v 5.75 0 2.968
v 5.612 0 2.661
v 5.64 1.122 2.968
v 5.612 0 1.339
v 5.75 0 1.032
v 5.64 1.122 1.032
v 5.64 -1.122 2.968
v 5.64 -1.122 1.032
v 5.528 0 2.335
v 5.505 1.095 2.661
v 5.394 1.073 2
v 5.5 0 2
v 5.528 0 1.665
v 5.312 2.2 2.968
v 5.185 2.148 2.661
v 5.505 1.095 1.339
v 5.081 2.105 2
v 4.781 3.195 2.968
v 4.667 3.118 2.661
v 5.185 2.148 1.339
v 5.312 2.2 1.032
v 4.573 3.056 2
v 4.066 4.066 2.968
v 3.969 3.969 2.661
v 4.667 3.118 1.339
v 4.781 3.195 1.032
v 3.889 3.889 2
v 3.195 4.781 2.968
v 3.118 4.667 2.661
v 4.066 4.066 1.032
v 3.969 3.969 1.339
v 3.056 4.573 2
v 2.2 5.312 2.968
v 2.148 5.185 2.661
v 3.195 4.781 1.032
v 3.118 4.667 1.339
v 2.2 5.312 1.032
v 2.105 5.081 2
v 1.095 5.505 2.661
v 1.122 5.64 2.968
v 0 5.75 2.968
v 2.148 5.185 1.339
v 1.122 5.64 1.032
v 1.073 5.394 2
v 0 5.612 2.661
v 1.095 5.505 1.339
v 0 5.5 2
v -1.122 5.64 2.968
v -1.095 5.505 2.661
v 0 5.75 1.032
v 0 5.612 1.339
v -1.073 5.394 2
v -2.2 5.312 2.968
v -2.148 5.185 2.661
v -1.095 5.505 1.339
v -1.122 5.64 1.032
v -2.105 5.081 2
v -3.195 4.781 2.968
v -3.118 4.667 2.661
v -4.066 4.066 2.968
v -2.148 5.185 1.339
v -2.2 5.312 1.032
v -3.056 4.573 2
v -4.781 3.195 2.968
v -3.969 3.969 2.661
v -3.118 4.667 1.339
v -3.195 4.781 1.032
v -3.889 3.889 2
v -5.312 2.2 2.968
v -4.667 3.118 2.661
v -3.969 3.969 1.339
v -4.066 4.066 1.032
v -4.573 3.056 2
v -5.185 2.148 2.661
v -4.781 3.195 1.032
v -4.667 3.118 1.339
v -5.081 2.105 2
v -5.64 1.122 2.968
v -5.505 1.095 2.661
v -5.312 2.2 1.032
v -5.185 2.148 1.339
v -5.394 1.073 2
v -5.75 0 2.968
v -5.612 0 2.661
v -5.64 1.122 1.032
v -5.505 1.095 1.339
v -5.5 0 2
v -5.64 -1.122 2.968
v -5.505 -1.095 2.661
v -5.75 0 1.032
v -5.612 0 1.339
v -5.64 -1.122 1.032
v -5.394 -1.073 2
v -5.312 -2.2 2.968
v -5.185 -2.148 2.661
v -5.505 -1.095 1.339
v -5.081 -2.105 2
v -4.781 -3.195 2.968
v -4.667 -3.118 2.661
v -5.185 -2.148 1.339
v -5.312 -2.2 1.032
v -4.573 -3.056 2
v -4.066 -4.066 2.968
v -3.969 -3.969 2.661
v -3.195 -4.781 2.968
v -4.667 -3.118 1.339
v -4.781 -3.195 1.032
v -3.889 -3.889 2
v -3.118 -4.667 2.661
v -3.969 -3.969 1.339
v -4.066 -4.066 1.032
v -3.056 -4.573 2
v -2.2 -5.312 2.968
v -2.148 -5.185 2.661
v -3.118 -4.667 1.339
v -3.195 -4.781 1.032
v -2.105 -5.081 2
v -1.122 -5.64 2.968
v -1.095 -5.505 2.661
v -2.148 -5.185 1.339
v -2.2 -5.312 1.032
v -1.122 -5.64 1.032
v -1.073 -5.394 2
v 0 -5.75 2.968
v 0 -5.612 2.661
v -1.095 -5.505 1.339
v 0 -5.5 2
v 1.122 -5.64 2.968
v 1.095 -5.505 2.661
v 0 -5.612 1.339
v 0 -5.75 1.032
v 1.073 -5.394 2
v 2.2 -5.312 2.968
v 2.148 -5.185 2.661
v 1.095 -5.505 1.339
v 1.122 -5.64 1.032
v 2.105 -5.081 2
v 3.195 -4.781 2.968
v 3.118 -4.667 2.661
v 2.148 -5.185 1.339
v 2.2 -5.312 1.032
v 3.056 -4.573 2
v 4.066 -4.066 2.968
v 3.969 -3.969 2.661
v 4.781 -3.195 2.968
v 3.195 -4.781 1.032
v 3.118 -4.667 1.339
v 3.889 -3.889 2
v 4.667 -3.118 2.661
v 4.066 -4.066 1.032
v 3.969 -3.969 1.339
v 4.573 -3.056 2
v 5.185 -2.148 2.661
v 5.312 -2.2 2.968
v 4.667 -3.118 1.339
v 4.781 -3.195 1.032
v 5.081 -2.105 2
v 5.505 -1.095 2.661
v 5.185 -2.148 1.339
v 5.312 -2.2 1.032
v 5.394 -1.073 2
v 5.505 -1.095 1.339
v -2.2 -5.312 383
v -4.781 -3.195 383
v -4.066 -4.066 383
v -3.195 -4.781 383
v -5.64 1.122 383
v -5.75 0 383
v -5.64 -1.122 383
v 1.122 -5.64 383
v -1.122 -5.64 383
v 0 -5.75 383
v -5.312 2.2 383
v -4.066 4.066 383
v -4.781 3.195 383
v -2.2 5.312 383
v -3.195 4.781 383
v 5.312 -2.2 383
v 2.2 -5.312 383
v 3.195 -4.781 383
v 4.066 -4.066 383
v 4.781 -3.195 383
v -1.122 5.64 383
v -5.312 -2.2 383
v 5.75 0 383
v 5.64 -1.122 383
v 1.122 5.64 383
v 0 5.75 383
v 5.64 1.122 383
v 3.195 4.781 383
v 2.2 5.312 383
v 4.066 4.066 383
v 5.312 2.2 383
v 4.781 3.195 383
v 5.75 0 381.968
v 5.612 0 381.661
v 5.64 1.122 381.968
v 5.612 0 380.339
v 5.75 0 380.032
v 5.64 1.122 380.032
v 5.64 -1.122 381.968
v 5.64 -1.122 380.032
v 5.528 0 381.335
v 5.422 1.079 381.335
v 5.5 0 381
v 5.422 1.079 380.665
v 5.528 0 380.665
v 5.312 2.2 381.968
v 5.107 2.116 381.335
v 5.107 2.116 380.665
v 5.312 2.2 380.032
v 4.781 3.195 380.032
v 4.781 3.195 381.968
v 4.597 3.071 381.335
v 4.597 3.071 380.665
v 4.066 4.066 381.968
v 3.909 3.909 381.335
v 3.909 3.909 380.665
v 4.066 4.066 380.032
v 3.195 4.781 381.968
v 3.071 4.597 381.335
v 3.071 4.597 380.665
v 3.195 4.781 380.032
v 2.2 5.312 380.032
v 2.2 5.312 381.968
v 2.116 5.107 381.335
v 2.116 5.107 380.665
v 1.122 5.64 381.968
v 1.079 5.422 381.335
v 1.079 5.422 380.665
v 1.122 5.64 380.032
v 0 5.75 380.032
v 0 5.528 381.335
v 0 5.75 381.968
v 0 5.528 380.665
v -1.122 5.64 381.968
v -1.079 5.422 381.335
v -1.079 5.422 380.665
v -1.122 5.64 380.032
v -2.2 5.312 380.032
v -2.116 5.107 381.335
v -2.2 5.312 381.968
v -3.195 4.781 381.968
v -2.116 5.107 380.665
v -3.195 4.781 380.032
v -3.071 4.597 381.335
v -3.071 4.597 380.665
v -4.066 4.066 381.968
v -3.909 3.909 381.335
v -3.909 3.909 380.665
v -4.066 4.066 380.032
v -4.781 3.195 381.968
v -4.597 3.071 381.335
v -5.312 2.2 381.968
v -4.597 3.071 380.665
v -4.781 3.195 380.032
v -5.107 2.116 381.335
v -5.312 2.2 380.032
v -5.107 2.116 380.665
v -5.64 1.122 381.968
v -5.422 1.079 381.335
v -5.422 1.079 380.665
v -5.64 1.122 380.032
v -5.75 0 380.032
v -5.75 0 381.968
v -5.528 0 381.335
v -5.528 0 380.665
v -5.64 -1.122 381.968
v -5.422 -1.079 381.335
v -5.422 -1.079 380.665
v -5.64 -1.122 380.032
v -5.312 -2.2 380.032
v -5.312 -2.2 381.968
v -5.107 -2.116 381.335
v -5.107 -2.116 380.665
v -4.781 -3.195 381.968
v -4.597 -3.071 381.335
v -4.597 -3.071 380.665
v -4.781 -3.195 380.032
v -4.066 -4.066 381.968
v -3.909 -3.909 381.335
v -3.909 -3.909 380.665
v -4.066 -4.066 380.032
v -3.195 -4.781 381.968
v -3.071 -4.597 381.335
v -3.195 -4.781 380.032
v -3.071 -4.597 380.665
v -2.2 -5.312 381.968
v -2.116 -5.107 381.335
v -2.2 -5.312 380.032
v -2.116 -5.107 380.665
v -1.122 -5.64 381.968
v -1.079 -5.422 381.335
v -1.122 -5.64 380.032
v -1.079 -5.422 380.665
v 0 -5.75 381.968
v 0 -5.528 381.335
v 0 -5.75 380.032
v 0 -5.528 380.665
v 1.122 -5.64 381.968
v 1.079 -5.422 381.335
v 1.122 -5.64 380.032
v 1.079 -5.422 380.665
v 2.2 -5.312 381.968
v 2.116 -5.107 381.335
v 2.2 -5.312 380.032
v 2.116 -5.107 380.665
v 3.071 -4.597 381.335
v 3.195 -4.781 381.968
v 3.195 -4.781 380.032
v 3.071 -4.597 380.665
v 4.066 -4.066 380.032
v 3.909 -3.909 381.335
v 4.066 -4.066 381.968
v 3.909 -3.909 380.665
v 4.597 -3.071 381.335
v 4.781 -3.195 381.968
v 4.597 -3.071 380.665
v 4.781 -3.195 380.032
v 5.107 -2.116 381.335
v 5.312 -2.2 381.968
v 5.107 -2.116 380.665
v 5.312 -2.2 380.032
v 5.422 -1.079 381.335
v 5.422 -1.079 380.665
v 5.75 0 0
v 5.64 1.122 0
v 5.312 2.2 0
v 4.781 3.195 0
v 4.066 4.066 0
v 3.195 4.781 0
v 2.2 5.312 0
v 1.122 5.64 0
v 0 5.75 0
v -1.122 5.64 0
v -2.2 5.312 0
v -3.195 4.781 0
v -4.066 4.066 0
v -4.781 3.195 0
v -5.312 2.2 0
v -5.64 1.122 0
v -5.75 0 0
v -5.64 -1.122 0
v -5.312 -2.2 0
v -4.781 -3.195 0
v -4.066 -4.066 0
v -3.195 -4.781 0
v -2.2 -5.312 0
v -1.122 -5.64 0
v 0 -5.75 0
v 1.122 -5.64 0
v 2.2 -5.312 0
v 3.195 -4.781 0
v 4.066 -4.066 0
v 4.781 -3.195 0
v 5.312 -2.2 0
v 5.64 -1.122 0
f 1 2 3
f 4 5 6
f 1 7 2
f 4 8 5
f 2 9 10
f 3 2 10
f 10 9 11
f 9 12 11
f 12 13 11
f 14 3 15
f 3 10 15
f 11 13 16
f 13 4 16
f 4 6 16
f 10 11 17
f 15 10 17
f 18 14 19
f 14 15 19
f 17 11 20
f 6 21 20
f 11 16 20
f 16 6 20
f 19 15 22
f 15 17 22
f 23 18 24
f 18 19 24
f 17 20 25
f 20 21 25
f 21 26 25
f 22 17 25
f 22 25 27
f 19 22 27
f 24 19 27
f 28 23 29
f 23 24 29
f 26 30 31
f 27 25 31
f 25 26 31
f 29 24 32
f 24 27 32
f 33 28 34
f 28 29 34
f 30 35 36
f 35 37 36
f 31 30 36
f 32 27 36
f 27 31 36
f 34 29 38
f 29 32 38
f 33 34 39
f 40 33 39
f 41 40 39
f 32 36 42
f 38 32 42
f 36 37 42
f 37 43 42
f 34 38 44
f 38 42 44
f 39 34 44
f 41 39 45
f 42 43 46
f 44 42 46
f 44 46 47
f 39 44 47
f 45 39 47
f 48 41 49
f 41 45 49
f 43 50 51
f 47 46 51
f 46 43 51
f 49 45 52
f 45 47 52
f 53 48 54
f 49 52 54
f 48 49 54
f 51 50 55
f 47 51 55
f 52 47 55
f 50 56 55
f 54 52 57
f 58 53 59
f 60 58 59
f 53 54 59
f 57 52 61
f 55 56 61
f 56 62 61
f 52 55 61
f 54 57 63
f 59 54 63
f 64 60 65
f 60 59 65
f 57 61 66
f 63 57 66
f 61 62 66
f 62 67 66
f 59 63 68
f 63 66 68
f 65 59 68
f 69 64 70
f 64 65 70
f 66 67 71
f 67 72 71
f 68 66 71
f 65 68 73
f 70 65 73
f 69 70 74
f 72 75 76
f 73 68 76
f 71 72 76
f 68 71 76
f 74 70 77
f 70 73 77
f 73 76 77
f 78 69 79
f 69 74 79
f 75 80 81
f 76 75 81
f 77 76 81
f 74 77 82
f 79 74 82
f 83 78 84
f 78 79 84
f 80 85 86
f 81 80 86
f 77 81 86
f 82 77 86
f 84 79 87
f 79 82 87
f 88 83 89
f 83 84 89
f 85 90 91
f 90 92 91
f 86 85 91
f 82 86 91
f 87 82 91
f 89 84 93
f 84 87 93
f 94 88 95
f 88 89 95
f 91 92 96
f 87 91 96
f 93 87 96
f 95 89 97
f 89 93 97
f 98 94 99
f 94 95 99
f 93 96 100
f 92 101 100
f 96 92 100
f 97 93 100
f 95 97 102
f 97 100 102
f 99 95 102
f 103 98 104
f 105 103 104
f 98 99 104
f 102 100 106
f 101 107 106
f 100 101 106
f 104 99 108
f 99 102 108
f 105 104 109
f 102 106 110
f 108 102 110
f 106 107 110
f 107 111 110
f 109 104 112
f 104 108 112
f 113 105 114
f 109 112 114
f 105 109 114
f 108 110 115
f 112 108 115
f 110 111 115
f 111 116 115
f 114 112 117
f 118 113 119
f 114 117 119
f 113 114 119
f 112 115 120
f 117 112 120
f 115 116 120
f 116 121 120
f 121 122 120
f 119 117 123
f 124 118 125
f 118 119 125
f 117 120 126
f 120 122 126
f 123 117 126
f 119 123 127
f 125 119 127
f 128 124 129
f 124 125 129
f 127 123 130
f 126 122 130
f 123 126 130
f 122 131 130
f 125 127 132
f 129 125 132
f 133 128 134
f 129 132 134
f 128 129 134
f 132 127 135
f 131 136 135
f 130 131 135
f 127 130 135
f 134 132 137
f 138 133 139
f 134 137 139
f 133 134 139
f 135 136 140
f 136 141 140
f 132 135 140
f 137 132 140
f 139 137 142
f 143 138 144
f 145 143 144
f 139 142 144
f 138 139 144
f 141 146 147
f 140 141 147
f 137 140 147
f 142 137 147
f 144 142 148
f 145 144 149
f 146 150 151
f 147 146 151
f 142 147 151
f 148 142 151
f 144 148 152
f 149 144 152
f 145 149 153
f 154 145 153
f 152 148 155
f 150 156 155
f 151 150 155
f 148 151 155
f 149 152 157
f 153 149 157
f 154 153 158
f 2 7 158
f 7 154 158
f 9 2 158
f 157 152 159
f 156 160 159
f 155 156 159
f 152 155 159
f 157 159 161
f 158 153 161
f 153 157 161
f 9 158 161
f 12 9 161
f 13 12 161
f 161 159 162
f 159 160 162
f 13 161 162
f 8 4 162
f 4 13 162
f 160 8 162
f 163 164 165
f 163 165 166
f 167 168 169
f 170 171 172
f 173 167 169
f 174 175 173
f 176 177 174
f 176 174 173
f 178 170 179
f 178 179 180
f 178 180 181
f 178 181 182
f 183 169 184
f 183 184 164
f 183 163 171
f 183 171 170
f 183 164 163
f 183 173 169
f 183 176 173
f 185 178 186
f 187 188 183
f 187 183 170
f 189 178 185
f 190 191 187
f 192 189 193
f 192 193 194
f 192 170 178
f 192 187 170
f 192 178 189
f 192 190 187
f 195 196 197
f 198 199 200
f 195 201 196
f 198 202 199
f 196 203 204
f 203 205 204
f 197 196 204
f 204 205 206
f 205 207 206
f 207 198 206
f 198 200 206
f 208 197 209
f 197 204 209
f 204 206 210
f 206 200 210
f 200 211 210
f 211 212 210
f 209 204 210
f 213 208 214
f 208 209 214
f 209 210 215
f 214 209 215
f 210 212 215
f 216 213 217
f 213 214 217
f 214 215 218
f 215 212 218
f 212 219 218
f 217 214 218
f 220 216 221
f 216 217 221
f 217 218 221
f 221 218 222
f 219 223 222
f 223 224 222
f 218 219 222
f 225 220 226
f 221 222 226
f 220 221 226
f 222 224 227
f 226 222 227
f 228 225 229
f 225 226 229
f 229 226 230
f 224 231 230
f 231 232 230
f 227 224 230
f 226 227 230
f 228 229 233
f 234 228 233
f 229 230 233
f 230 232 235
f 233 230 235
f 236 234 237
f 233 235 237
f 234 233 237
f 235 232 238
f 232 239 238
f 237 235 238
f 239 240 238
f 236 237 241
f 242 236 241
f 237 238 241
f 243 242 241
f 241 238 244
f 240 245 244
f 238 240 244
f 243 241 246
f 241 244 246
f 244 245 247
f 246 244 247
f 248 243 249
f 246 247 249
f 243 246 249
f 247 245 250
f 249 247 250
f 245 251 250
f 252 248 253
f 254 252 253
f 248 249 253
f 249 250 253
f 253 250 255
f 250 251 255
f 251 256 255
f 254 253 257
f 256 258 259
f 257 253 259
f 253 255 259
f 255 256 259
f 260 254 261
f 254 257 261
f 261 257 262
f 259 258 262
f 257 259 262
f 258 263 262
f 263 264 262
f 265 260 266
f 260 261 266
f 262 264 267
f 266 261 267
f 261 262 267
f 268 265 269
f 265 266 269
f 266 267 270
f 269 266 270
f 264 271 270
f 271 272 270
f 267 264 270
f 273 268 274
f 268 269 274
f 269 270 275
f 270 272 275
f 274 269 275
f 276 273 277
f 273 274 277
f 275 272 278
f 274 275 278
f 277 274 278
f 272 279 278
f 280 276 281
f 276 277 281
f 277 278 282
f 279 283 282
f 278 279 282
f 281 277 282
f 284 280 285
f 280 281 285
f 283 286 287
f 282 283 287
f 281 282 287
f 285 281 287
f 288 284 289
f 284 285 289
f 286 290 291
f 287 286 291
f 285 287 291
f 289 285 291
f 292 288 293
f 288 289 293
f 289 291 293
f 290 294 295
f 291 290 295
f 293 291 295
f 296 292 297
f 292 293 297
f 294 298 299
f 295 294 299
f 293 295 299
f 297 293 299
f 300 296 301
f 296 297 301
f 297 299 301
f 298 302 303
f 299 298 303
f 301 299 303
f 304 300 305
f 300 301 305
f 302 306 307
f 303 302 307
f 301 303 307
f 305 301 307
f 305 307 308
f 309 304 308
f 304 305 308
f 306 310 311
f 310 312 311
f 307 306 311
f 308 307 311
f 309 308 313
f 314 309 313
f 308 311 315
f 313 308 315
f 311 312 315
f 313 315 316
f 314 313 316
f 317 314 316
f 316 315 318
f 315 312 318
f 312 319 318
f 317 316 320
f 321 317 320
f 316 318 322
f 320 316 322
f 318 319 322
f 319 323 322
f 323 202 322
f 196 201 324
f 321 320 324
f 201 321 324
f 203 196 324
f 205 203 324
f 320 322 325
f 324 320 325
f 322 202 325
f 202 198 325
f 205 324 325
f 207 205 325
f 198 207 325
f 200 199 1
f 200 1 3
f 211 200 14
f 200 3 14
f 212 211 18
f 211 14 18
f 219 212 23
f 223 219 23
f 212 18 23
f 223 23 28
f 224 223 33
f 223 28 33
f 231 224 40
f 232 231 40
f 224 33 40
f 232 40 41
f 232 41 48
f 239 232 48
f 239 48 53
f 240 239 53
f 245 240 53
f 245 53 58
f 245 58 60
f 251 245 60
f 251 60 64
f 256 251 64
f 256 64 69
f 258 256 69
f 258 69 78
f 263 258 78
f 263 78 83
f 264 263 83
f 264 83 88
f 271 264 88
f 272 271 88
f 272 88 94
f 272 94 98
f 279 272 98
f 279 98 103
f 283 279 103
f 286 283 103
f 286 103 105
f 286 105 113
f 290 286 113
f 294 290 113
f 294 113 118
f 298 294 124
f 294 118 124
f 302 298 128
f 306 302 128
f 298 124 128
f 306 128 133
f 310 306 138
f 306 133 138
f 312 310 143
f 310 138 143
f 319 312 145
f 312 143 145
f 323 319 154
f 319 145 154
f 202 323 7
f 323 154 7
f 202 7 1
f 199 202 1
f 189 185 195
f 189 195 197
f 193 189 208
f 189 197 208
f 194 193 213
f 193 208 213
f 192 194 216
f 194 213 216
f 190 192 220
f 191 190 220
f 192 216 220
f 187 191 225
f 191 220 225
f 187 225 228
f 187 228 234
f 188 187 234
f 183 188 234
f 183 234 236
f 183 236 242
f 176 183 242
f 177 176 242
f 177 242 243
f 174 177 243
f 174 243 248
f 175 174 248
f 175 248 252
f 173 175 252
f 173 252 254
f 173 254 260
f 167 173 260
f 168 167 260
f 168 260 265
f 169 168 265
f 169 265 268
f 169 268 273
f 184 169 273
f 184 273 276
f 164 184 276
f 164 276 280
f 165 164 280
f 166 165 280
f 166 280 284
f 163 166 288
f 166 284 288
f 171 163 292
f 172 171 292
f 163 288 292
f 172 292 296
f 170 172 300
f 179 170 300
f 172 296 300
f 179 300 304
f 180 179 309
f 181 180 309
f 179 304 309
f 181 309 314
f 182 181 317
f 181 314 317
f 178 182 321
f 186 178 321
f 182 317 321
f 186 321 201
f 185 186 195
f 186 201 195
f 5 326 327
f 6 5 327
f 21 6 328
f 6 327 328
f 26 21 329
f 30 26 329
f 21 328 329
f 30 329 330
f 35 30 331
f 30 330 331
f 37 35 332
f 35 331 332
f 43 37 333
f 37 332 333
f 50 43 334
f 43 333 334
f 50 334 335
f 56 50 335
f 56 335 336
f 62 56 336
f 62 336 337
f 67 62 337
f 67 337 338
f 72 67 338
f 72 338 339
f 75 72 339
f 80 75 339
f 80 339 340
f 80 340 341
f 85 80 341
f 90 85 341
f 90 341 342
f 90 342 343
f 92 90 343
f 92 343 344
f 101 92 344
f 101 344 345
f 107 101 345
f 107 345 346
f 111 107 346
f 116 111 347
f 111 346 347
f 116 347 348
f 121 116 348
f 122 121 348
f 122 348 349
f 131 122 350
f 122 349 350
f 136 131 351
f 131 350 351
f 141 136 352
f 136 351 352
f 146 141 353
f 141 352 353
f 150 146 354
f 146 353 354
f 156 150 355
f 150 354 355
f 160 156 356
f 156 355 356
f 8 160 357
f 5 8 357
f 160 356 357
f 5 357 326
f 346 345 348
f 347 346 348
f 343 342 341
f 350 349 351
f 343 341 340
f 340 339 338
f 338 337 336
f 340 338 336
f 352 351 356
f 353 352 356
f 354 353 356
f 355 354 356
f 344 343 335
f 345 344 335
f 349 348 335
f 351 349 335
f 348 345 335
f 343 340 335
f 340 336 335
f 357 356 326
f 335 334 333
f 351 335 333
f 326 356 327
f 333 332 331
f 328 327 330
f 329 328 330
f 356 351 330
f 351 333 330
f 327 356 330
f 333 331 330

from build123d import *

# Parameters (mm, degrees)
TORUS001_R     = 2
TORUS_R        = 2
CYLINDER_R     = 5.75
CYLINDER_DEPTH = 383


with BuildPart() as torus001:
    # Torus001 → Torus001 (revolve)
    with BuildSketch(Plane(origin=(0, 0, 381), x_dir=(1, 0, 0), z_dir=(0, -1, 0))):
        with Locations((7.5, 0)):
            Circle(TORUS001_R)
    revolve(axis=Axis((0, 0, 381), (0, 0, 1)))


with BuildPart() as torus:
    # Torus → Torus (revolve)
    with BuildSketch(Plane(origin=(0, 0, 2), x_dir=(1, 0, 0), z_dir=(0, -1, 0))):
        with Locations((7.5, 0)):
            Circle(TORUS_R)
    revolve(axis=Axis((0, 0, 2), (0, 0, 1)))


with BuildPart() as cut001:
    # Cylinder → Cylinder (new body)
    with BuildSketch(Plane.XY):
        Circle(CYLINDER_R)
    extrude(amount=CYLINDER_DEPTH)

    # Cut: cut Torus
    add(torus.part, mode=Mode.SUBTRACT)

    # Cut001: cut Torus001
    add(torus001.part, mode=Mode.SUBTRACT)


solid = cut001.part
